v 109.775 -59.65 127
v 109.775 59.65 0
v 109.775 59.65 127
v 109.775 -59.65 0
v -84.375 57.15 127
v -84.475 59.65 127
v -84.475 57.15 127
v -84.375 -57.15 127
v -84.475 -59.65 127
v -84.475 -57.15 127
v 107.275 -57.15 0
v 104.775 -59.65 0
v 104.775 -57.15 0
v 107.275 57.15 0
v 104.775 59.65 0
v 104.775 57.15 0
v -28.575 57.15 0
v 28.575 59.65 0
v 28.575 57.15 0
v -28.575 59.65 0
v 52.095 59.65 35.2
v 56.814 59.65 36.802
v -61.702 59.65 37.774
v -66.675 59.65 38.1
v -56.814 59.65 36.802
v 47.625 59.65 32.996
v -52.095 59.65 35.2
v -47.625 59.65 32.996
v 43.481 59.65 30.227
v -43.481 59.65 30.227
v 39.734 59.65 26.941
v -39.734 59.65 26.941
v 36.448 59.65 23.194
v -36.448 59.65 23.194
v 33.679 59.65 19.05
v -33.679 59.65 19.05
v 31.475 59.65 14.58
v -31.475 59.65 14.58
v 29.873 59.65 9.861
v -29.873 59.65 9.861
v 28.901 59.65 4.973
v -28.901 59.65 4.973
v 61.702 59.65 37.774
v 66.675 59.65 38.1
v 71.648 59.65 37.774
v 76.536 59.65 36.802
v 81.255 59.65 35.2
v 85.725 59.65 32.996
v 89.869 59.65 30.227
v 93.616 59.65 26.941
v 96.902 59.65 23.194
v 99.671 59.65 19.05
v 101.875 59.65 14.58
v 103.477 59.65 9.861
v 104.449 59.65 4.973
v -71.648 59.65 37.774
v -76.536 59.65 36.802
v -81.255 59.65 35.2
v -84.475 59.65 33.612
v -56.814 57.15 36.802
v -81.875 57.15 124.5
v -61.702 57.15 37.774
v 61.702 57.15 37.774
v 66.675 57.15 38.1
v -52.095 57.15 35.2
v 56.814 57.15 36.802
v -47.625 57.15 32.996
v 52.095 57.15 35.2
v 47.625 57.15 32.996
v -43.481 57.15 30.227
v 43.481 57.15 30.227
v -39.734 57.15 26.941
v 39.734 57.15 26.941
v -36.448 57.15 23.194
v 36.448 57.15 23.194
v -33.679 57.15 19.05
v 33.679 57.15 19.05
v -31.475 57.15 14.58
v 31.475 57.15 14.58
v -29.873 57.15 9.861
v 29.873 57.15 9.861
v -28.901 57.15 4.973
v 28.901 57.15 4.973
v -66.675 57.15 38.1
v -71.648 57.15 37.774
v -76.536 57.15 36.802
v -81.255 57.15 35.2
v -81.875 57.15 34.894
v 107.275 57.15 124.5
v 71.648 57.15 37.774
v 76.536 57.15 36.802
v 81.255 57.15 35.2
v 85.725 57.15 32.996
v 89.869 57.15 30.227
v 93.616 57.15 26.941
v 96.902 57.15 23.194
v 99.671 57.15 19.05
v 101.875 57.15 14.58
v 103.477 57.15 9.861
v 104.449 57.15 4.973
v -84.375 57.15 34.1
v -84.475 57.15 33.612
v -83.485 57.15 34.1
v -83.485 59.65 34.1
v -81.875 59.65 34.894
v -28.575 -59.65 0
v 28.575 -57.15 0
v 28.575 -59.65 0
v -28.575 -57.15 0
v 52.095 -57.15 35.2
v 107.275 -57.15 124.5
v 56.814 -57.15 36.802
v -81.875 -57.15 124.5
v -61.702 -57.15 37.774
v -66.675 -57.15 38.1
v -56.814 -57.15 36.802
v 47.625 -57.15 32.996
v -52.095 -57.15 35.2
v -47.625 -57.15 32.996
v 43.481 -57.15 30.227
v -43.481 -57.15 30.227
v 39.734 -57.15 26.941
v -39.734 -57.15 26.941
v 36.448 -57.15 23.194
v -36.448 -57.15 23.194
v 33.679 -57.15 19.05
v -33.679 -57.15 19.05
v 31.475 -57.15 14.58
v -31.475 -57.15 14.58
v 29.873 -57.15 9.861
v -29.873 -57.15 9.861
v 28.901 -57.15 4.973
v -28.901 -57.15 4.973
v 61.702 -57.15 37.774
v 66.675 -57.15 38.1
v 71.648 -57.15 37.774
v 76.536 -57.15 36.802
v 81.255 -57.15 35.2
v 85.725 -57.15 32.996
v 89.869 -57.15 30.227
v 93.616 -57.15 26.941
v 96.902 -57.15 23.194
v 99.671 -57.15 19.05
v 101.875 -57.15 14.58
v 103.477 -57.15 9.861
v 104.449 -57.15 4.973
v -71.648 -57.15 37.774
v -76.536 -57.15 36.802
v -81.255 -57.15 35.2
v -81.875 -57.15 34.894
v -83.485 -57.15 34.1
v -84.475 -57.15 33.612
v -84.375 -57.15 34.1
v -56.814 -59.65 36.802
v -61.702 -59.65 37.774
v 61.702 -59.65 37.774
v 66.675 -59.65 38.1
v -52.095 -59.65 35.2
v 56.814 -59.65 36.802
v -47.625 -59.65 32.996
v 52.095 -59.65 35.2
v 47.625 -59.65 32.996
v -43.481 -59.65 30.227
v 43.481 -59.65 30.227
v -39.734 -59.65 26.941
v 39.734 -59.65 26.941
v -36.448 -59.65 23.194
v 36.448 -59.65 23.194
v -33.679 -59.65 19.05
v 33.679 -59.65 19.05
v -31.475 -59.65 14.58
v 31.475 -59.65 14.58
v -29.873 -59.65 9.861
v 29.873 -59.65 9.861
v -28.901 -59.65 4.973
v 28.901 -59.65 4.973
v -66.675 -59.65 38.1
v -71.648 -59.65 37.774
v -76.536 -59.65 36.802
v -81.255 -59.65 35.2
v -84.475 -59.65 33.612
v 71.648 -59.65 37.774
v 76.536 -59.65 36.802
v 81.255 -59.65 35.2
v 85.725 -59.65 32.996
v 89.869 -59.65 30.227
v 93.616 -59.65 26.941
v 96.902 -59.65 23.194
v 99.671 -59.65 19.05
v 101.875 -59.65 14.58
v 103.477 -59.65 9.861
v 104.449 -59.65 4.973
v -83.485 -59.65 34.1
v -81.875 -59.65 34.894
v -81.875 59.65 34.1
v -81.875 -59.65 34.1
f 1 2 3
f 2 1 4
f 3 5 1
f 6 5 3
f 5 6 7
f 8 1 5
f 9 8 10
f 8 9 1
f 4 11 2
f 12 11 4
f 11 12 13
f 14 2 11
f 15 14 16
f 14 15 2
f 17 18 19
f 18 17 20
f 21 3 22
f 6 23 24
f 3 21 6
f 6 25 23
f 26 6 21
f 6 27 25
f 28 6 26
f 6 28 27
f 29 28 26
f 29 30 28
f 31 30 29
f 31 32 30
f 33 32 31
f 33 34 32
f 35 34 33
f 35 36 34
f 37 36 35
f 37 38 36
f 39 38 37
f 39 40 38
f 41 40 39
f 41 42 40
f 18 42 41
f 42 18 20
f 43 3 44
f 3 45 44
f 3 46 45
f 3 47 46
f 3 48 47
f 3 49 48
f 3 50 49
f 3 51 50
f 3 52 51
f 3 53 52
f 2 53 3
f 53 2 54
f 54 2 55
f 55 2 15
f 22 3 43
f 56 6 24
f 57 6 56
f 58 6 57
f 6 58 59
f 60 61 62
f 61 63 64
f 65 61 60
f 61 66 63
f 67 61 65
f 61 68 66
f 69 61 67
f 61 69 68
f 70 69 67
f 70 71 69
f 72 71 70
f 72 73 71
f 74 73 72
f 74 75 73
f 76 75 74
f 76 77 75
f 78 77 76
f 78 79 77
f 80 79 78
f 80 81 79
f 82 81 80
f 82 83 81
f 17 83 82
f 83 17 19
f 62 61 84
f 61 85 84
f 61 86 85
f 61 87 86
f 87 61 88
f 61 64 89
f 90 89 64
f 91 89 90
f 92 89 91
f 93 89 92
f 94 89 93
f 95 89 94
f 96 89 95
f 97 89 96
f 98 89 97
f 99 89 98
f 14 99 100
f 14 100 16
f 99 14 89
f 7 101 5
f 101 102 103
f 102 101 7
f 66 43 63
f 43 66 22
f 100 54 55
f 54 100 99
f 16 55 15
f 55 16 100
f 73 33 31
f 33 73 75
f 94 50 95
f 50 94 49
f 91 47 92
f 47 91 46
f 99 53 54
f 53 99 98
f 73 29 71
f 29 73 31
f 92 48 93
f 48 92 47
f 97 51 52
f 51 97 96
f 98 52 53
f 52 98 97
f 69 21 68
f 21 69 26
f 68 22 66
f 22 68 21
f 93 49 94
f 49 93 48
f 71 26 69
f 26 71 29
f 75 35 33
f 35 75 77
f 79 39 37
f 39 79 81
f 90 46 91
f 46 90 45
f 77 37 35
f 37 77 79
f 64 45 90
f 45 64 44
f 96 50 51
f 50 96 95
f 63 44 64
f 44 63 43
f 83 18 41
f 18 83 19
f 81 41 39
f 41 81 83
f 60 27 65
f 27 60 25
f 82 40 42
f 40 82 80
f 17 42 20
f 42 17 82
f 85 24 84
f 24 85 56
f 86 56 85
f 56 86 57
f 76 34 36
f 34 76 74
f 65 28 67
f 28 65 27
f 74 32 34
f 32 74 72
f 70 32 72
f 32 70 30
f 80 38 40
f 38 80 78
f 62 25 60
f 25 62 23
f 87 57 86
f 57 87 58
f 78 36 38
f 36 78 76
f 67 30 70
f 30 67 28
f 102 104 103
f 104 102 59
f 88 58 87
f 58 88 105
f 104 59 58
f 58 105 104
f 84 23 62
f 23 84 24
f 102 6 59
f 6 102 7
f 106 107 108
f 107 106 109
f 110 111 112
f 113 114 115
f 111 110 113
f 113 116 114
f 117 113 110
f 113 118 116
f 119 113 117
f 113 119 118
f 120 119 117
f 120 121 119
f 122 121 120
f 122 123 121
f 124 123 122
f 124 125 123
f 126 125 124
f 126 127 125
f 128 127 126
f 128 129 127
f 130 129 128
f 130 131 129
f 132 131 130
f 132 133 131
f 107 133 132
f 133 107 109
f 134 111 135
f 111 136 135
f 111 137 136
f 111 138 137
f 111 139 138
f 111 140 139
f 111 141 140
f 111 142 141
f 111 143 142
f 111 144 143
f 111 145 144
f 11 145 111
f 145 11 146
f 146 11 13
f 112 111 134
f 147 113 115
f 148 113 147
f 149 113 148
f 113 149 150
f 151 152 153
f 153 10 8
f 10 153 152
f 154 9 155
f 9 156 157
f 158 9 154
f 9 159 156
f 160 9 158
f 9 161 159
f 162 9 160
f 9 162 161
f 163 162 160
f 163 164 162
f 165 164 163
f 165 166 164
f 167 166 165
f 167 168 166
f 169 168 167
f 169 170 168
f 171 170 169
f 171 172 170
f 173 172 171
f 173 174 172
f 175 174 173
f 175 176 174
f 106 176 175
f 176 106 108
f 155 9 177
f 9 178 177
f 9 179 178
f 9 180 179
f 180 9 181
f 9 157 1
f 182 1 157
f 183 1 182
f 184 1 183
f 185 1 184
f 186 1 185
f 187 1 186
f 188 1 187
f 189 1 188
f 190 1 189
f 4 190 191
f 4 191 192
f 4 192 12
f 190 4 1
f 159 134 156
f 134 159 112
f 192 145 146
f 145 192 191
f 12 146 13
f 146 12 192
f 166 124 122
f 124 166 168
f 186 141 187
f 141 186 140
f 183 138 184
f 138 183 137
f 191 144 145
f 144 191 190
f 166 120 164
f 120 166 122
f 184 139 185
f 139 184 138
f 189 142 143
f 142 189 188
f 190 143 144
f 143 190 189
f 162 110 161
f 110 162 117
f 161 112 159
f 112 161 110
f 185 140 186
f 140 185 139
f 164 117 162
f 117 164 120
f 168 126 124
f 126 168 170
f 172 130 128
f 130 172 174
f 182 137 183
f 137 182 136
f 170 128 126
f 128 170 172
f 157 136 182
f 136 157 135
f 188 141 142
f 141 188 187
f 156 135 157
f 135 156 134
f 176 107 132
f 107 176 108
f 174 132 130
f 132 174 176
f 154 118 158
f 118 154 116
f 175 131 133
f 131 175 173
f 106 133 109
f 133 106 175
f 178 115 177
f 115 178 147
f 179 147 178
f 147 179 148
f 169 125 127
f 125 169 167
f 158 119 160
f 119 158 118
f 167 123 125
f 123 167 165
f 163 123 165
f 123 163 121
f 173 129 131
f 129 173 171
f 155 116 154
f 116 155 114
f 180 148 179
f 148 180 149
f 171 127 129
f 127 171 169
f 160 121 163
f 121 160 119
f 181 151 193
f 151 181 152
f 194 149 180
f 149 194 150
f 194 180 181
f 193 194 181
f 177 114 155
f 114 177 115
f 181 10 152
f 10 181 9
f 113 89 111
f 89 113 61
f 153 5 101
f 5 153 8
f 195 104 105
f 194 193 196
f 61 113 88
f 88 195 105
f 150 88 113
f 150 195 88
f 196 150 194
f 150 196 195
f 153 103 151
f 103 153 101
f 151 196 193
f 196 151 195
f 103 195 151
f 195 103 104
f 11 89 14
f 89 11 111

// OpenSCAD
// ============================================
// ESCORT BOT — SIDE PANEL ONLY
// ============================================
// Measured by Romeo 2026-03-19:
//   Tire diameter: 2.5" (63.5mm)
//   Gap between front & rear tires: 2.5" (63.5mm)
// ============================================

// --- MEASUREMENTS ---
wheel_d    = 63.5;     // 2.5" tire diameter
tire_gap   = 69.85;    // 2-3/4" gap between front & rear tires
wheel_r    = 76.2 / 2;         // 3" wide arches (38.1mm radius)

// --- SIDE PANEL DIMS ---
panel_h    = 127;      // 5" tall (to outside edge of ceiling)
wall       = 2.5;      // wall thickness
wheel_arch_h = 40;     // arch cutout height from bottom
panel_gap  = 114.3;    // 4.5" between the two side panels

// Panel length = front arch + gap + rear arch
// Axle-to-axle = tire_gap + wheel_d = 127mm
// Panel extends a bit past each wheel center
wx = (tire_gap + wheel_d) / 2;  // 63.5mm — wheel center from midpoint
panel_l    = wx * 2 + wheel_r * 2 + 10;  // total length with some margin

// --- BUILD ---
frame_head = 28.575;   // 1-1/8" — front arch stops here (frame head height)

module side_panel() {
    difference() {
        // Flat panel
        translate([-panel_l/2, 0, 0])
            cube([panel_l, wall, panel_h]);

        // Front wheel arch
        translate([wx, wall + 0.1, 0])
            rotate([90, 0, 0])
                cylinder(r=wheel_r, h=wall + 0.2, $fn=48);

        // Rear wheel arch
        translate([-wx, wall + 0.1, 0])
            rotate([90, 0, 0])
                cylinder(r=wheel_r, h=wall + 0.2, $fn=48);

        // Trim 1" from back end (length only, full height)
        translate([-panel_l/2 - 0.1, -0.1, -0.1])
            cube([25.4, wall + 0.2, panel_h + 0.2]);

    }
}

// Left panel
color("#2a2a2a")
    translate([0, panel_gap/2, 0])
        side_panel();

// Right panel (mirrored)
color("#2a2a2a")
    translate([0, -panel_gap/2 - wall, 0])
        side_panel();

// Ceiling — shortened 1" at back to match side panels
color("#333")
    translate([-panel_l/2 + 25.4, -panel_gap/2 - wall, panel_h - wall])
        cube([panel_l - 25.4, panel_gap + wall * 2, wall]);

// Back panel — moved forward 1", bottom fine-tuned
color("#2a2a2a")
    translate([-panel_l/2 + 25.4, -panel_gap/2 - wall, wheel_r - 4.0])
        cube([wall, panel_gap + wall * 2, panel_h - (wheel_r - 4.0)]);


// Front panel wall
color("#2a2a2a")
    translate([panel_l/2 - wall, -panel_gap/2 - wall, 0])
        cube([wall, panel_gap + wall * 2, panel_h]);

echo(str("Panel length: ", panel_l, " mm"));
echo(str("Panel height: ", panel_h, " mm"));
echo(str("Panel gap: ", panel_gap, " mm (4.5\")"));
echo(str("Wheel arch radius: ", wheel_r, " mm"));
echo(str("Axle-to-axle: ", tire_gap + wheel_d, " mm"));
